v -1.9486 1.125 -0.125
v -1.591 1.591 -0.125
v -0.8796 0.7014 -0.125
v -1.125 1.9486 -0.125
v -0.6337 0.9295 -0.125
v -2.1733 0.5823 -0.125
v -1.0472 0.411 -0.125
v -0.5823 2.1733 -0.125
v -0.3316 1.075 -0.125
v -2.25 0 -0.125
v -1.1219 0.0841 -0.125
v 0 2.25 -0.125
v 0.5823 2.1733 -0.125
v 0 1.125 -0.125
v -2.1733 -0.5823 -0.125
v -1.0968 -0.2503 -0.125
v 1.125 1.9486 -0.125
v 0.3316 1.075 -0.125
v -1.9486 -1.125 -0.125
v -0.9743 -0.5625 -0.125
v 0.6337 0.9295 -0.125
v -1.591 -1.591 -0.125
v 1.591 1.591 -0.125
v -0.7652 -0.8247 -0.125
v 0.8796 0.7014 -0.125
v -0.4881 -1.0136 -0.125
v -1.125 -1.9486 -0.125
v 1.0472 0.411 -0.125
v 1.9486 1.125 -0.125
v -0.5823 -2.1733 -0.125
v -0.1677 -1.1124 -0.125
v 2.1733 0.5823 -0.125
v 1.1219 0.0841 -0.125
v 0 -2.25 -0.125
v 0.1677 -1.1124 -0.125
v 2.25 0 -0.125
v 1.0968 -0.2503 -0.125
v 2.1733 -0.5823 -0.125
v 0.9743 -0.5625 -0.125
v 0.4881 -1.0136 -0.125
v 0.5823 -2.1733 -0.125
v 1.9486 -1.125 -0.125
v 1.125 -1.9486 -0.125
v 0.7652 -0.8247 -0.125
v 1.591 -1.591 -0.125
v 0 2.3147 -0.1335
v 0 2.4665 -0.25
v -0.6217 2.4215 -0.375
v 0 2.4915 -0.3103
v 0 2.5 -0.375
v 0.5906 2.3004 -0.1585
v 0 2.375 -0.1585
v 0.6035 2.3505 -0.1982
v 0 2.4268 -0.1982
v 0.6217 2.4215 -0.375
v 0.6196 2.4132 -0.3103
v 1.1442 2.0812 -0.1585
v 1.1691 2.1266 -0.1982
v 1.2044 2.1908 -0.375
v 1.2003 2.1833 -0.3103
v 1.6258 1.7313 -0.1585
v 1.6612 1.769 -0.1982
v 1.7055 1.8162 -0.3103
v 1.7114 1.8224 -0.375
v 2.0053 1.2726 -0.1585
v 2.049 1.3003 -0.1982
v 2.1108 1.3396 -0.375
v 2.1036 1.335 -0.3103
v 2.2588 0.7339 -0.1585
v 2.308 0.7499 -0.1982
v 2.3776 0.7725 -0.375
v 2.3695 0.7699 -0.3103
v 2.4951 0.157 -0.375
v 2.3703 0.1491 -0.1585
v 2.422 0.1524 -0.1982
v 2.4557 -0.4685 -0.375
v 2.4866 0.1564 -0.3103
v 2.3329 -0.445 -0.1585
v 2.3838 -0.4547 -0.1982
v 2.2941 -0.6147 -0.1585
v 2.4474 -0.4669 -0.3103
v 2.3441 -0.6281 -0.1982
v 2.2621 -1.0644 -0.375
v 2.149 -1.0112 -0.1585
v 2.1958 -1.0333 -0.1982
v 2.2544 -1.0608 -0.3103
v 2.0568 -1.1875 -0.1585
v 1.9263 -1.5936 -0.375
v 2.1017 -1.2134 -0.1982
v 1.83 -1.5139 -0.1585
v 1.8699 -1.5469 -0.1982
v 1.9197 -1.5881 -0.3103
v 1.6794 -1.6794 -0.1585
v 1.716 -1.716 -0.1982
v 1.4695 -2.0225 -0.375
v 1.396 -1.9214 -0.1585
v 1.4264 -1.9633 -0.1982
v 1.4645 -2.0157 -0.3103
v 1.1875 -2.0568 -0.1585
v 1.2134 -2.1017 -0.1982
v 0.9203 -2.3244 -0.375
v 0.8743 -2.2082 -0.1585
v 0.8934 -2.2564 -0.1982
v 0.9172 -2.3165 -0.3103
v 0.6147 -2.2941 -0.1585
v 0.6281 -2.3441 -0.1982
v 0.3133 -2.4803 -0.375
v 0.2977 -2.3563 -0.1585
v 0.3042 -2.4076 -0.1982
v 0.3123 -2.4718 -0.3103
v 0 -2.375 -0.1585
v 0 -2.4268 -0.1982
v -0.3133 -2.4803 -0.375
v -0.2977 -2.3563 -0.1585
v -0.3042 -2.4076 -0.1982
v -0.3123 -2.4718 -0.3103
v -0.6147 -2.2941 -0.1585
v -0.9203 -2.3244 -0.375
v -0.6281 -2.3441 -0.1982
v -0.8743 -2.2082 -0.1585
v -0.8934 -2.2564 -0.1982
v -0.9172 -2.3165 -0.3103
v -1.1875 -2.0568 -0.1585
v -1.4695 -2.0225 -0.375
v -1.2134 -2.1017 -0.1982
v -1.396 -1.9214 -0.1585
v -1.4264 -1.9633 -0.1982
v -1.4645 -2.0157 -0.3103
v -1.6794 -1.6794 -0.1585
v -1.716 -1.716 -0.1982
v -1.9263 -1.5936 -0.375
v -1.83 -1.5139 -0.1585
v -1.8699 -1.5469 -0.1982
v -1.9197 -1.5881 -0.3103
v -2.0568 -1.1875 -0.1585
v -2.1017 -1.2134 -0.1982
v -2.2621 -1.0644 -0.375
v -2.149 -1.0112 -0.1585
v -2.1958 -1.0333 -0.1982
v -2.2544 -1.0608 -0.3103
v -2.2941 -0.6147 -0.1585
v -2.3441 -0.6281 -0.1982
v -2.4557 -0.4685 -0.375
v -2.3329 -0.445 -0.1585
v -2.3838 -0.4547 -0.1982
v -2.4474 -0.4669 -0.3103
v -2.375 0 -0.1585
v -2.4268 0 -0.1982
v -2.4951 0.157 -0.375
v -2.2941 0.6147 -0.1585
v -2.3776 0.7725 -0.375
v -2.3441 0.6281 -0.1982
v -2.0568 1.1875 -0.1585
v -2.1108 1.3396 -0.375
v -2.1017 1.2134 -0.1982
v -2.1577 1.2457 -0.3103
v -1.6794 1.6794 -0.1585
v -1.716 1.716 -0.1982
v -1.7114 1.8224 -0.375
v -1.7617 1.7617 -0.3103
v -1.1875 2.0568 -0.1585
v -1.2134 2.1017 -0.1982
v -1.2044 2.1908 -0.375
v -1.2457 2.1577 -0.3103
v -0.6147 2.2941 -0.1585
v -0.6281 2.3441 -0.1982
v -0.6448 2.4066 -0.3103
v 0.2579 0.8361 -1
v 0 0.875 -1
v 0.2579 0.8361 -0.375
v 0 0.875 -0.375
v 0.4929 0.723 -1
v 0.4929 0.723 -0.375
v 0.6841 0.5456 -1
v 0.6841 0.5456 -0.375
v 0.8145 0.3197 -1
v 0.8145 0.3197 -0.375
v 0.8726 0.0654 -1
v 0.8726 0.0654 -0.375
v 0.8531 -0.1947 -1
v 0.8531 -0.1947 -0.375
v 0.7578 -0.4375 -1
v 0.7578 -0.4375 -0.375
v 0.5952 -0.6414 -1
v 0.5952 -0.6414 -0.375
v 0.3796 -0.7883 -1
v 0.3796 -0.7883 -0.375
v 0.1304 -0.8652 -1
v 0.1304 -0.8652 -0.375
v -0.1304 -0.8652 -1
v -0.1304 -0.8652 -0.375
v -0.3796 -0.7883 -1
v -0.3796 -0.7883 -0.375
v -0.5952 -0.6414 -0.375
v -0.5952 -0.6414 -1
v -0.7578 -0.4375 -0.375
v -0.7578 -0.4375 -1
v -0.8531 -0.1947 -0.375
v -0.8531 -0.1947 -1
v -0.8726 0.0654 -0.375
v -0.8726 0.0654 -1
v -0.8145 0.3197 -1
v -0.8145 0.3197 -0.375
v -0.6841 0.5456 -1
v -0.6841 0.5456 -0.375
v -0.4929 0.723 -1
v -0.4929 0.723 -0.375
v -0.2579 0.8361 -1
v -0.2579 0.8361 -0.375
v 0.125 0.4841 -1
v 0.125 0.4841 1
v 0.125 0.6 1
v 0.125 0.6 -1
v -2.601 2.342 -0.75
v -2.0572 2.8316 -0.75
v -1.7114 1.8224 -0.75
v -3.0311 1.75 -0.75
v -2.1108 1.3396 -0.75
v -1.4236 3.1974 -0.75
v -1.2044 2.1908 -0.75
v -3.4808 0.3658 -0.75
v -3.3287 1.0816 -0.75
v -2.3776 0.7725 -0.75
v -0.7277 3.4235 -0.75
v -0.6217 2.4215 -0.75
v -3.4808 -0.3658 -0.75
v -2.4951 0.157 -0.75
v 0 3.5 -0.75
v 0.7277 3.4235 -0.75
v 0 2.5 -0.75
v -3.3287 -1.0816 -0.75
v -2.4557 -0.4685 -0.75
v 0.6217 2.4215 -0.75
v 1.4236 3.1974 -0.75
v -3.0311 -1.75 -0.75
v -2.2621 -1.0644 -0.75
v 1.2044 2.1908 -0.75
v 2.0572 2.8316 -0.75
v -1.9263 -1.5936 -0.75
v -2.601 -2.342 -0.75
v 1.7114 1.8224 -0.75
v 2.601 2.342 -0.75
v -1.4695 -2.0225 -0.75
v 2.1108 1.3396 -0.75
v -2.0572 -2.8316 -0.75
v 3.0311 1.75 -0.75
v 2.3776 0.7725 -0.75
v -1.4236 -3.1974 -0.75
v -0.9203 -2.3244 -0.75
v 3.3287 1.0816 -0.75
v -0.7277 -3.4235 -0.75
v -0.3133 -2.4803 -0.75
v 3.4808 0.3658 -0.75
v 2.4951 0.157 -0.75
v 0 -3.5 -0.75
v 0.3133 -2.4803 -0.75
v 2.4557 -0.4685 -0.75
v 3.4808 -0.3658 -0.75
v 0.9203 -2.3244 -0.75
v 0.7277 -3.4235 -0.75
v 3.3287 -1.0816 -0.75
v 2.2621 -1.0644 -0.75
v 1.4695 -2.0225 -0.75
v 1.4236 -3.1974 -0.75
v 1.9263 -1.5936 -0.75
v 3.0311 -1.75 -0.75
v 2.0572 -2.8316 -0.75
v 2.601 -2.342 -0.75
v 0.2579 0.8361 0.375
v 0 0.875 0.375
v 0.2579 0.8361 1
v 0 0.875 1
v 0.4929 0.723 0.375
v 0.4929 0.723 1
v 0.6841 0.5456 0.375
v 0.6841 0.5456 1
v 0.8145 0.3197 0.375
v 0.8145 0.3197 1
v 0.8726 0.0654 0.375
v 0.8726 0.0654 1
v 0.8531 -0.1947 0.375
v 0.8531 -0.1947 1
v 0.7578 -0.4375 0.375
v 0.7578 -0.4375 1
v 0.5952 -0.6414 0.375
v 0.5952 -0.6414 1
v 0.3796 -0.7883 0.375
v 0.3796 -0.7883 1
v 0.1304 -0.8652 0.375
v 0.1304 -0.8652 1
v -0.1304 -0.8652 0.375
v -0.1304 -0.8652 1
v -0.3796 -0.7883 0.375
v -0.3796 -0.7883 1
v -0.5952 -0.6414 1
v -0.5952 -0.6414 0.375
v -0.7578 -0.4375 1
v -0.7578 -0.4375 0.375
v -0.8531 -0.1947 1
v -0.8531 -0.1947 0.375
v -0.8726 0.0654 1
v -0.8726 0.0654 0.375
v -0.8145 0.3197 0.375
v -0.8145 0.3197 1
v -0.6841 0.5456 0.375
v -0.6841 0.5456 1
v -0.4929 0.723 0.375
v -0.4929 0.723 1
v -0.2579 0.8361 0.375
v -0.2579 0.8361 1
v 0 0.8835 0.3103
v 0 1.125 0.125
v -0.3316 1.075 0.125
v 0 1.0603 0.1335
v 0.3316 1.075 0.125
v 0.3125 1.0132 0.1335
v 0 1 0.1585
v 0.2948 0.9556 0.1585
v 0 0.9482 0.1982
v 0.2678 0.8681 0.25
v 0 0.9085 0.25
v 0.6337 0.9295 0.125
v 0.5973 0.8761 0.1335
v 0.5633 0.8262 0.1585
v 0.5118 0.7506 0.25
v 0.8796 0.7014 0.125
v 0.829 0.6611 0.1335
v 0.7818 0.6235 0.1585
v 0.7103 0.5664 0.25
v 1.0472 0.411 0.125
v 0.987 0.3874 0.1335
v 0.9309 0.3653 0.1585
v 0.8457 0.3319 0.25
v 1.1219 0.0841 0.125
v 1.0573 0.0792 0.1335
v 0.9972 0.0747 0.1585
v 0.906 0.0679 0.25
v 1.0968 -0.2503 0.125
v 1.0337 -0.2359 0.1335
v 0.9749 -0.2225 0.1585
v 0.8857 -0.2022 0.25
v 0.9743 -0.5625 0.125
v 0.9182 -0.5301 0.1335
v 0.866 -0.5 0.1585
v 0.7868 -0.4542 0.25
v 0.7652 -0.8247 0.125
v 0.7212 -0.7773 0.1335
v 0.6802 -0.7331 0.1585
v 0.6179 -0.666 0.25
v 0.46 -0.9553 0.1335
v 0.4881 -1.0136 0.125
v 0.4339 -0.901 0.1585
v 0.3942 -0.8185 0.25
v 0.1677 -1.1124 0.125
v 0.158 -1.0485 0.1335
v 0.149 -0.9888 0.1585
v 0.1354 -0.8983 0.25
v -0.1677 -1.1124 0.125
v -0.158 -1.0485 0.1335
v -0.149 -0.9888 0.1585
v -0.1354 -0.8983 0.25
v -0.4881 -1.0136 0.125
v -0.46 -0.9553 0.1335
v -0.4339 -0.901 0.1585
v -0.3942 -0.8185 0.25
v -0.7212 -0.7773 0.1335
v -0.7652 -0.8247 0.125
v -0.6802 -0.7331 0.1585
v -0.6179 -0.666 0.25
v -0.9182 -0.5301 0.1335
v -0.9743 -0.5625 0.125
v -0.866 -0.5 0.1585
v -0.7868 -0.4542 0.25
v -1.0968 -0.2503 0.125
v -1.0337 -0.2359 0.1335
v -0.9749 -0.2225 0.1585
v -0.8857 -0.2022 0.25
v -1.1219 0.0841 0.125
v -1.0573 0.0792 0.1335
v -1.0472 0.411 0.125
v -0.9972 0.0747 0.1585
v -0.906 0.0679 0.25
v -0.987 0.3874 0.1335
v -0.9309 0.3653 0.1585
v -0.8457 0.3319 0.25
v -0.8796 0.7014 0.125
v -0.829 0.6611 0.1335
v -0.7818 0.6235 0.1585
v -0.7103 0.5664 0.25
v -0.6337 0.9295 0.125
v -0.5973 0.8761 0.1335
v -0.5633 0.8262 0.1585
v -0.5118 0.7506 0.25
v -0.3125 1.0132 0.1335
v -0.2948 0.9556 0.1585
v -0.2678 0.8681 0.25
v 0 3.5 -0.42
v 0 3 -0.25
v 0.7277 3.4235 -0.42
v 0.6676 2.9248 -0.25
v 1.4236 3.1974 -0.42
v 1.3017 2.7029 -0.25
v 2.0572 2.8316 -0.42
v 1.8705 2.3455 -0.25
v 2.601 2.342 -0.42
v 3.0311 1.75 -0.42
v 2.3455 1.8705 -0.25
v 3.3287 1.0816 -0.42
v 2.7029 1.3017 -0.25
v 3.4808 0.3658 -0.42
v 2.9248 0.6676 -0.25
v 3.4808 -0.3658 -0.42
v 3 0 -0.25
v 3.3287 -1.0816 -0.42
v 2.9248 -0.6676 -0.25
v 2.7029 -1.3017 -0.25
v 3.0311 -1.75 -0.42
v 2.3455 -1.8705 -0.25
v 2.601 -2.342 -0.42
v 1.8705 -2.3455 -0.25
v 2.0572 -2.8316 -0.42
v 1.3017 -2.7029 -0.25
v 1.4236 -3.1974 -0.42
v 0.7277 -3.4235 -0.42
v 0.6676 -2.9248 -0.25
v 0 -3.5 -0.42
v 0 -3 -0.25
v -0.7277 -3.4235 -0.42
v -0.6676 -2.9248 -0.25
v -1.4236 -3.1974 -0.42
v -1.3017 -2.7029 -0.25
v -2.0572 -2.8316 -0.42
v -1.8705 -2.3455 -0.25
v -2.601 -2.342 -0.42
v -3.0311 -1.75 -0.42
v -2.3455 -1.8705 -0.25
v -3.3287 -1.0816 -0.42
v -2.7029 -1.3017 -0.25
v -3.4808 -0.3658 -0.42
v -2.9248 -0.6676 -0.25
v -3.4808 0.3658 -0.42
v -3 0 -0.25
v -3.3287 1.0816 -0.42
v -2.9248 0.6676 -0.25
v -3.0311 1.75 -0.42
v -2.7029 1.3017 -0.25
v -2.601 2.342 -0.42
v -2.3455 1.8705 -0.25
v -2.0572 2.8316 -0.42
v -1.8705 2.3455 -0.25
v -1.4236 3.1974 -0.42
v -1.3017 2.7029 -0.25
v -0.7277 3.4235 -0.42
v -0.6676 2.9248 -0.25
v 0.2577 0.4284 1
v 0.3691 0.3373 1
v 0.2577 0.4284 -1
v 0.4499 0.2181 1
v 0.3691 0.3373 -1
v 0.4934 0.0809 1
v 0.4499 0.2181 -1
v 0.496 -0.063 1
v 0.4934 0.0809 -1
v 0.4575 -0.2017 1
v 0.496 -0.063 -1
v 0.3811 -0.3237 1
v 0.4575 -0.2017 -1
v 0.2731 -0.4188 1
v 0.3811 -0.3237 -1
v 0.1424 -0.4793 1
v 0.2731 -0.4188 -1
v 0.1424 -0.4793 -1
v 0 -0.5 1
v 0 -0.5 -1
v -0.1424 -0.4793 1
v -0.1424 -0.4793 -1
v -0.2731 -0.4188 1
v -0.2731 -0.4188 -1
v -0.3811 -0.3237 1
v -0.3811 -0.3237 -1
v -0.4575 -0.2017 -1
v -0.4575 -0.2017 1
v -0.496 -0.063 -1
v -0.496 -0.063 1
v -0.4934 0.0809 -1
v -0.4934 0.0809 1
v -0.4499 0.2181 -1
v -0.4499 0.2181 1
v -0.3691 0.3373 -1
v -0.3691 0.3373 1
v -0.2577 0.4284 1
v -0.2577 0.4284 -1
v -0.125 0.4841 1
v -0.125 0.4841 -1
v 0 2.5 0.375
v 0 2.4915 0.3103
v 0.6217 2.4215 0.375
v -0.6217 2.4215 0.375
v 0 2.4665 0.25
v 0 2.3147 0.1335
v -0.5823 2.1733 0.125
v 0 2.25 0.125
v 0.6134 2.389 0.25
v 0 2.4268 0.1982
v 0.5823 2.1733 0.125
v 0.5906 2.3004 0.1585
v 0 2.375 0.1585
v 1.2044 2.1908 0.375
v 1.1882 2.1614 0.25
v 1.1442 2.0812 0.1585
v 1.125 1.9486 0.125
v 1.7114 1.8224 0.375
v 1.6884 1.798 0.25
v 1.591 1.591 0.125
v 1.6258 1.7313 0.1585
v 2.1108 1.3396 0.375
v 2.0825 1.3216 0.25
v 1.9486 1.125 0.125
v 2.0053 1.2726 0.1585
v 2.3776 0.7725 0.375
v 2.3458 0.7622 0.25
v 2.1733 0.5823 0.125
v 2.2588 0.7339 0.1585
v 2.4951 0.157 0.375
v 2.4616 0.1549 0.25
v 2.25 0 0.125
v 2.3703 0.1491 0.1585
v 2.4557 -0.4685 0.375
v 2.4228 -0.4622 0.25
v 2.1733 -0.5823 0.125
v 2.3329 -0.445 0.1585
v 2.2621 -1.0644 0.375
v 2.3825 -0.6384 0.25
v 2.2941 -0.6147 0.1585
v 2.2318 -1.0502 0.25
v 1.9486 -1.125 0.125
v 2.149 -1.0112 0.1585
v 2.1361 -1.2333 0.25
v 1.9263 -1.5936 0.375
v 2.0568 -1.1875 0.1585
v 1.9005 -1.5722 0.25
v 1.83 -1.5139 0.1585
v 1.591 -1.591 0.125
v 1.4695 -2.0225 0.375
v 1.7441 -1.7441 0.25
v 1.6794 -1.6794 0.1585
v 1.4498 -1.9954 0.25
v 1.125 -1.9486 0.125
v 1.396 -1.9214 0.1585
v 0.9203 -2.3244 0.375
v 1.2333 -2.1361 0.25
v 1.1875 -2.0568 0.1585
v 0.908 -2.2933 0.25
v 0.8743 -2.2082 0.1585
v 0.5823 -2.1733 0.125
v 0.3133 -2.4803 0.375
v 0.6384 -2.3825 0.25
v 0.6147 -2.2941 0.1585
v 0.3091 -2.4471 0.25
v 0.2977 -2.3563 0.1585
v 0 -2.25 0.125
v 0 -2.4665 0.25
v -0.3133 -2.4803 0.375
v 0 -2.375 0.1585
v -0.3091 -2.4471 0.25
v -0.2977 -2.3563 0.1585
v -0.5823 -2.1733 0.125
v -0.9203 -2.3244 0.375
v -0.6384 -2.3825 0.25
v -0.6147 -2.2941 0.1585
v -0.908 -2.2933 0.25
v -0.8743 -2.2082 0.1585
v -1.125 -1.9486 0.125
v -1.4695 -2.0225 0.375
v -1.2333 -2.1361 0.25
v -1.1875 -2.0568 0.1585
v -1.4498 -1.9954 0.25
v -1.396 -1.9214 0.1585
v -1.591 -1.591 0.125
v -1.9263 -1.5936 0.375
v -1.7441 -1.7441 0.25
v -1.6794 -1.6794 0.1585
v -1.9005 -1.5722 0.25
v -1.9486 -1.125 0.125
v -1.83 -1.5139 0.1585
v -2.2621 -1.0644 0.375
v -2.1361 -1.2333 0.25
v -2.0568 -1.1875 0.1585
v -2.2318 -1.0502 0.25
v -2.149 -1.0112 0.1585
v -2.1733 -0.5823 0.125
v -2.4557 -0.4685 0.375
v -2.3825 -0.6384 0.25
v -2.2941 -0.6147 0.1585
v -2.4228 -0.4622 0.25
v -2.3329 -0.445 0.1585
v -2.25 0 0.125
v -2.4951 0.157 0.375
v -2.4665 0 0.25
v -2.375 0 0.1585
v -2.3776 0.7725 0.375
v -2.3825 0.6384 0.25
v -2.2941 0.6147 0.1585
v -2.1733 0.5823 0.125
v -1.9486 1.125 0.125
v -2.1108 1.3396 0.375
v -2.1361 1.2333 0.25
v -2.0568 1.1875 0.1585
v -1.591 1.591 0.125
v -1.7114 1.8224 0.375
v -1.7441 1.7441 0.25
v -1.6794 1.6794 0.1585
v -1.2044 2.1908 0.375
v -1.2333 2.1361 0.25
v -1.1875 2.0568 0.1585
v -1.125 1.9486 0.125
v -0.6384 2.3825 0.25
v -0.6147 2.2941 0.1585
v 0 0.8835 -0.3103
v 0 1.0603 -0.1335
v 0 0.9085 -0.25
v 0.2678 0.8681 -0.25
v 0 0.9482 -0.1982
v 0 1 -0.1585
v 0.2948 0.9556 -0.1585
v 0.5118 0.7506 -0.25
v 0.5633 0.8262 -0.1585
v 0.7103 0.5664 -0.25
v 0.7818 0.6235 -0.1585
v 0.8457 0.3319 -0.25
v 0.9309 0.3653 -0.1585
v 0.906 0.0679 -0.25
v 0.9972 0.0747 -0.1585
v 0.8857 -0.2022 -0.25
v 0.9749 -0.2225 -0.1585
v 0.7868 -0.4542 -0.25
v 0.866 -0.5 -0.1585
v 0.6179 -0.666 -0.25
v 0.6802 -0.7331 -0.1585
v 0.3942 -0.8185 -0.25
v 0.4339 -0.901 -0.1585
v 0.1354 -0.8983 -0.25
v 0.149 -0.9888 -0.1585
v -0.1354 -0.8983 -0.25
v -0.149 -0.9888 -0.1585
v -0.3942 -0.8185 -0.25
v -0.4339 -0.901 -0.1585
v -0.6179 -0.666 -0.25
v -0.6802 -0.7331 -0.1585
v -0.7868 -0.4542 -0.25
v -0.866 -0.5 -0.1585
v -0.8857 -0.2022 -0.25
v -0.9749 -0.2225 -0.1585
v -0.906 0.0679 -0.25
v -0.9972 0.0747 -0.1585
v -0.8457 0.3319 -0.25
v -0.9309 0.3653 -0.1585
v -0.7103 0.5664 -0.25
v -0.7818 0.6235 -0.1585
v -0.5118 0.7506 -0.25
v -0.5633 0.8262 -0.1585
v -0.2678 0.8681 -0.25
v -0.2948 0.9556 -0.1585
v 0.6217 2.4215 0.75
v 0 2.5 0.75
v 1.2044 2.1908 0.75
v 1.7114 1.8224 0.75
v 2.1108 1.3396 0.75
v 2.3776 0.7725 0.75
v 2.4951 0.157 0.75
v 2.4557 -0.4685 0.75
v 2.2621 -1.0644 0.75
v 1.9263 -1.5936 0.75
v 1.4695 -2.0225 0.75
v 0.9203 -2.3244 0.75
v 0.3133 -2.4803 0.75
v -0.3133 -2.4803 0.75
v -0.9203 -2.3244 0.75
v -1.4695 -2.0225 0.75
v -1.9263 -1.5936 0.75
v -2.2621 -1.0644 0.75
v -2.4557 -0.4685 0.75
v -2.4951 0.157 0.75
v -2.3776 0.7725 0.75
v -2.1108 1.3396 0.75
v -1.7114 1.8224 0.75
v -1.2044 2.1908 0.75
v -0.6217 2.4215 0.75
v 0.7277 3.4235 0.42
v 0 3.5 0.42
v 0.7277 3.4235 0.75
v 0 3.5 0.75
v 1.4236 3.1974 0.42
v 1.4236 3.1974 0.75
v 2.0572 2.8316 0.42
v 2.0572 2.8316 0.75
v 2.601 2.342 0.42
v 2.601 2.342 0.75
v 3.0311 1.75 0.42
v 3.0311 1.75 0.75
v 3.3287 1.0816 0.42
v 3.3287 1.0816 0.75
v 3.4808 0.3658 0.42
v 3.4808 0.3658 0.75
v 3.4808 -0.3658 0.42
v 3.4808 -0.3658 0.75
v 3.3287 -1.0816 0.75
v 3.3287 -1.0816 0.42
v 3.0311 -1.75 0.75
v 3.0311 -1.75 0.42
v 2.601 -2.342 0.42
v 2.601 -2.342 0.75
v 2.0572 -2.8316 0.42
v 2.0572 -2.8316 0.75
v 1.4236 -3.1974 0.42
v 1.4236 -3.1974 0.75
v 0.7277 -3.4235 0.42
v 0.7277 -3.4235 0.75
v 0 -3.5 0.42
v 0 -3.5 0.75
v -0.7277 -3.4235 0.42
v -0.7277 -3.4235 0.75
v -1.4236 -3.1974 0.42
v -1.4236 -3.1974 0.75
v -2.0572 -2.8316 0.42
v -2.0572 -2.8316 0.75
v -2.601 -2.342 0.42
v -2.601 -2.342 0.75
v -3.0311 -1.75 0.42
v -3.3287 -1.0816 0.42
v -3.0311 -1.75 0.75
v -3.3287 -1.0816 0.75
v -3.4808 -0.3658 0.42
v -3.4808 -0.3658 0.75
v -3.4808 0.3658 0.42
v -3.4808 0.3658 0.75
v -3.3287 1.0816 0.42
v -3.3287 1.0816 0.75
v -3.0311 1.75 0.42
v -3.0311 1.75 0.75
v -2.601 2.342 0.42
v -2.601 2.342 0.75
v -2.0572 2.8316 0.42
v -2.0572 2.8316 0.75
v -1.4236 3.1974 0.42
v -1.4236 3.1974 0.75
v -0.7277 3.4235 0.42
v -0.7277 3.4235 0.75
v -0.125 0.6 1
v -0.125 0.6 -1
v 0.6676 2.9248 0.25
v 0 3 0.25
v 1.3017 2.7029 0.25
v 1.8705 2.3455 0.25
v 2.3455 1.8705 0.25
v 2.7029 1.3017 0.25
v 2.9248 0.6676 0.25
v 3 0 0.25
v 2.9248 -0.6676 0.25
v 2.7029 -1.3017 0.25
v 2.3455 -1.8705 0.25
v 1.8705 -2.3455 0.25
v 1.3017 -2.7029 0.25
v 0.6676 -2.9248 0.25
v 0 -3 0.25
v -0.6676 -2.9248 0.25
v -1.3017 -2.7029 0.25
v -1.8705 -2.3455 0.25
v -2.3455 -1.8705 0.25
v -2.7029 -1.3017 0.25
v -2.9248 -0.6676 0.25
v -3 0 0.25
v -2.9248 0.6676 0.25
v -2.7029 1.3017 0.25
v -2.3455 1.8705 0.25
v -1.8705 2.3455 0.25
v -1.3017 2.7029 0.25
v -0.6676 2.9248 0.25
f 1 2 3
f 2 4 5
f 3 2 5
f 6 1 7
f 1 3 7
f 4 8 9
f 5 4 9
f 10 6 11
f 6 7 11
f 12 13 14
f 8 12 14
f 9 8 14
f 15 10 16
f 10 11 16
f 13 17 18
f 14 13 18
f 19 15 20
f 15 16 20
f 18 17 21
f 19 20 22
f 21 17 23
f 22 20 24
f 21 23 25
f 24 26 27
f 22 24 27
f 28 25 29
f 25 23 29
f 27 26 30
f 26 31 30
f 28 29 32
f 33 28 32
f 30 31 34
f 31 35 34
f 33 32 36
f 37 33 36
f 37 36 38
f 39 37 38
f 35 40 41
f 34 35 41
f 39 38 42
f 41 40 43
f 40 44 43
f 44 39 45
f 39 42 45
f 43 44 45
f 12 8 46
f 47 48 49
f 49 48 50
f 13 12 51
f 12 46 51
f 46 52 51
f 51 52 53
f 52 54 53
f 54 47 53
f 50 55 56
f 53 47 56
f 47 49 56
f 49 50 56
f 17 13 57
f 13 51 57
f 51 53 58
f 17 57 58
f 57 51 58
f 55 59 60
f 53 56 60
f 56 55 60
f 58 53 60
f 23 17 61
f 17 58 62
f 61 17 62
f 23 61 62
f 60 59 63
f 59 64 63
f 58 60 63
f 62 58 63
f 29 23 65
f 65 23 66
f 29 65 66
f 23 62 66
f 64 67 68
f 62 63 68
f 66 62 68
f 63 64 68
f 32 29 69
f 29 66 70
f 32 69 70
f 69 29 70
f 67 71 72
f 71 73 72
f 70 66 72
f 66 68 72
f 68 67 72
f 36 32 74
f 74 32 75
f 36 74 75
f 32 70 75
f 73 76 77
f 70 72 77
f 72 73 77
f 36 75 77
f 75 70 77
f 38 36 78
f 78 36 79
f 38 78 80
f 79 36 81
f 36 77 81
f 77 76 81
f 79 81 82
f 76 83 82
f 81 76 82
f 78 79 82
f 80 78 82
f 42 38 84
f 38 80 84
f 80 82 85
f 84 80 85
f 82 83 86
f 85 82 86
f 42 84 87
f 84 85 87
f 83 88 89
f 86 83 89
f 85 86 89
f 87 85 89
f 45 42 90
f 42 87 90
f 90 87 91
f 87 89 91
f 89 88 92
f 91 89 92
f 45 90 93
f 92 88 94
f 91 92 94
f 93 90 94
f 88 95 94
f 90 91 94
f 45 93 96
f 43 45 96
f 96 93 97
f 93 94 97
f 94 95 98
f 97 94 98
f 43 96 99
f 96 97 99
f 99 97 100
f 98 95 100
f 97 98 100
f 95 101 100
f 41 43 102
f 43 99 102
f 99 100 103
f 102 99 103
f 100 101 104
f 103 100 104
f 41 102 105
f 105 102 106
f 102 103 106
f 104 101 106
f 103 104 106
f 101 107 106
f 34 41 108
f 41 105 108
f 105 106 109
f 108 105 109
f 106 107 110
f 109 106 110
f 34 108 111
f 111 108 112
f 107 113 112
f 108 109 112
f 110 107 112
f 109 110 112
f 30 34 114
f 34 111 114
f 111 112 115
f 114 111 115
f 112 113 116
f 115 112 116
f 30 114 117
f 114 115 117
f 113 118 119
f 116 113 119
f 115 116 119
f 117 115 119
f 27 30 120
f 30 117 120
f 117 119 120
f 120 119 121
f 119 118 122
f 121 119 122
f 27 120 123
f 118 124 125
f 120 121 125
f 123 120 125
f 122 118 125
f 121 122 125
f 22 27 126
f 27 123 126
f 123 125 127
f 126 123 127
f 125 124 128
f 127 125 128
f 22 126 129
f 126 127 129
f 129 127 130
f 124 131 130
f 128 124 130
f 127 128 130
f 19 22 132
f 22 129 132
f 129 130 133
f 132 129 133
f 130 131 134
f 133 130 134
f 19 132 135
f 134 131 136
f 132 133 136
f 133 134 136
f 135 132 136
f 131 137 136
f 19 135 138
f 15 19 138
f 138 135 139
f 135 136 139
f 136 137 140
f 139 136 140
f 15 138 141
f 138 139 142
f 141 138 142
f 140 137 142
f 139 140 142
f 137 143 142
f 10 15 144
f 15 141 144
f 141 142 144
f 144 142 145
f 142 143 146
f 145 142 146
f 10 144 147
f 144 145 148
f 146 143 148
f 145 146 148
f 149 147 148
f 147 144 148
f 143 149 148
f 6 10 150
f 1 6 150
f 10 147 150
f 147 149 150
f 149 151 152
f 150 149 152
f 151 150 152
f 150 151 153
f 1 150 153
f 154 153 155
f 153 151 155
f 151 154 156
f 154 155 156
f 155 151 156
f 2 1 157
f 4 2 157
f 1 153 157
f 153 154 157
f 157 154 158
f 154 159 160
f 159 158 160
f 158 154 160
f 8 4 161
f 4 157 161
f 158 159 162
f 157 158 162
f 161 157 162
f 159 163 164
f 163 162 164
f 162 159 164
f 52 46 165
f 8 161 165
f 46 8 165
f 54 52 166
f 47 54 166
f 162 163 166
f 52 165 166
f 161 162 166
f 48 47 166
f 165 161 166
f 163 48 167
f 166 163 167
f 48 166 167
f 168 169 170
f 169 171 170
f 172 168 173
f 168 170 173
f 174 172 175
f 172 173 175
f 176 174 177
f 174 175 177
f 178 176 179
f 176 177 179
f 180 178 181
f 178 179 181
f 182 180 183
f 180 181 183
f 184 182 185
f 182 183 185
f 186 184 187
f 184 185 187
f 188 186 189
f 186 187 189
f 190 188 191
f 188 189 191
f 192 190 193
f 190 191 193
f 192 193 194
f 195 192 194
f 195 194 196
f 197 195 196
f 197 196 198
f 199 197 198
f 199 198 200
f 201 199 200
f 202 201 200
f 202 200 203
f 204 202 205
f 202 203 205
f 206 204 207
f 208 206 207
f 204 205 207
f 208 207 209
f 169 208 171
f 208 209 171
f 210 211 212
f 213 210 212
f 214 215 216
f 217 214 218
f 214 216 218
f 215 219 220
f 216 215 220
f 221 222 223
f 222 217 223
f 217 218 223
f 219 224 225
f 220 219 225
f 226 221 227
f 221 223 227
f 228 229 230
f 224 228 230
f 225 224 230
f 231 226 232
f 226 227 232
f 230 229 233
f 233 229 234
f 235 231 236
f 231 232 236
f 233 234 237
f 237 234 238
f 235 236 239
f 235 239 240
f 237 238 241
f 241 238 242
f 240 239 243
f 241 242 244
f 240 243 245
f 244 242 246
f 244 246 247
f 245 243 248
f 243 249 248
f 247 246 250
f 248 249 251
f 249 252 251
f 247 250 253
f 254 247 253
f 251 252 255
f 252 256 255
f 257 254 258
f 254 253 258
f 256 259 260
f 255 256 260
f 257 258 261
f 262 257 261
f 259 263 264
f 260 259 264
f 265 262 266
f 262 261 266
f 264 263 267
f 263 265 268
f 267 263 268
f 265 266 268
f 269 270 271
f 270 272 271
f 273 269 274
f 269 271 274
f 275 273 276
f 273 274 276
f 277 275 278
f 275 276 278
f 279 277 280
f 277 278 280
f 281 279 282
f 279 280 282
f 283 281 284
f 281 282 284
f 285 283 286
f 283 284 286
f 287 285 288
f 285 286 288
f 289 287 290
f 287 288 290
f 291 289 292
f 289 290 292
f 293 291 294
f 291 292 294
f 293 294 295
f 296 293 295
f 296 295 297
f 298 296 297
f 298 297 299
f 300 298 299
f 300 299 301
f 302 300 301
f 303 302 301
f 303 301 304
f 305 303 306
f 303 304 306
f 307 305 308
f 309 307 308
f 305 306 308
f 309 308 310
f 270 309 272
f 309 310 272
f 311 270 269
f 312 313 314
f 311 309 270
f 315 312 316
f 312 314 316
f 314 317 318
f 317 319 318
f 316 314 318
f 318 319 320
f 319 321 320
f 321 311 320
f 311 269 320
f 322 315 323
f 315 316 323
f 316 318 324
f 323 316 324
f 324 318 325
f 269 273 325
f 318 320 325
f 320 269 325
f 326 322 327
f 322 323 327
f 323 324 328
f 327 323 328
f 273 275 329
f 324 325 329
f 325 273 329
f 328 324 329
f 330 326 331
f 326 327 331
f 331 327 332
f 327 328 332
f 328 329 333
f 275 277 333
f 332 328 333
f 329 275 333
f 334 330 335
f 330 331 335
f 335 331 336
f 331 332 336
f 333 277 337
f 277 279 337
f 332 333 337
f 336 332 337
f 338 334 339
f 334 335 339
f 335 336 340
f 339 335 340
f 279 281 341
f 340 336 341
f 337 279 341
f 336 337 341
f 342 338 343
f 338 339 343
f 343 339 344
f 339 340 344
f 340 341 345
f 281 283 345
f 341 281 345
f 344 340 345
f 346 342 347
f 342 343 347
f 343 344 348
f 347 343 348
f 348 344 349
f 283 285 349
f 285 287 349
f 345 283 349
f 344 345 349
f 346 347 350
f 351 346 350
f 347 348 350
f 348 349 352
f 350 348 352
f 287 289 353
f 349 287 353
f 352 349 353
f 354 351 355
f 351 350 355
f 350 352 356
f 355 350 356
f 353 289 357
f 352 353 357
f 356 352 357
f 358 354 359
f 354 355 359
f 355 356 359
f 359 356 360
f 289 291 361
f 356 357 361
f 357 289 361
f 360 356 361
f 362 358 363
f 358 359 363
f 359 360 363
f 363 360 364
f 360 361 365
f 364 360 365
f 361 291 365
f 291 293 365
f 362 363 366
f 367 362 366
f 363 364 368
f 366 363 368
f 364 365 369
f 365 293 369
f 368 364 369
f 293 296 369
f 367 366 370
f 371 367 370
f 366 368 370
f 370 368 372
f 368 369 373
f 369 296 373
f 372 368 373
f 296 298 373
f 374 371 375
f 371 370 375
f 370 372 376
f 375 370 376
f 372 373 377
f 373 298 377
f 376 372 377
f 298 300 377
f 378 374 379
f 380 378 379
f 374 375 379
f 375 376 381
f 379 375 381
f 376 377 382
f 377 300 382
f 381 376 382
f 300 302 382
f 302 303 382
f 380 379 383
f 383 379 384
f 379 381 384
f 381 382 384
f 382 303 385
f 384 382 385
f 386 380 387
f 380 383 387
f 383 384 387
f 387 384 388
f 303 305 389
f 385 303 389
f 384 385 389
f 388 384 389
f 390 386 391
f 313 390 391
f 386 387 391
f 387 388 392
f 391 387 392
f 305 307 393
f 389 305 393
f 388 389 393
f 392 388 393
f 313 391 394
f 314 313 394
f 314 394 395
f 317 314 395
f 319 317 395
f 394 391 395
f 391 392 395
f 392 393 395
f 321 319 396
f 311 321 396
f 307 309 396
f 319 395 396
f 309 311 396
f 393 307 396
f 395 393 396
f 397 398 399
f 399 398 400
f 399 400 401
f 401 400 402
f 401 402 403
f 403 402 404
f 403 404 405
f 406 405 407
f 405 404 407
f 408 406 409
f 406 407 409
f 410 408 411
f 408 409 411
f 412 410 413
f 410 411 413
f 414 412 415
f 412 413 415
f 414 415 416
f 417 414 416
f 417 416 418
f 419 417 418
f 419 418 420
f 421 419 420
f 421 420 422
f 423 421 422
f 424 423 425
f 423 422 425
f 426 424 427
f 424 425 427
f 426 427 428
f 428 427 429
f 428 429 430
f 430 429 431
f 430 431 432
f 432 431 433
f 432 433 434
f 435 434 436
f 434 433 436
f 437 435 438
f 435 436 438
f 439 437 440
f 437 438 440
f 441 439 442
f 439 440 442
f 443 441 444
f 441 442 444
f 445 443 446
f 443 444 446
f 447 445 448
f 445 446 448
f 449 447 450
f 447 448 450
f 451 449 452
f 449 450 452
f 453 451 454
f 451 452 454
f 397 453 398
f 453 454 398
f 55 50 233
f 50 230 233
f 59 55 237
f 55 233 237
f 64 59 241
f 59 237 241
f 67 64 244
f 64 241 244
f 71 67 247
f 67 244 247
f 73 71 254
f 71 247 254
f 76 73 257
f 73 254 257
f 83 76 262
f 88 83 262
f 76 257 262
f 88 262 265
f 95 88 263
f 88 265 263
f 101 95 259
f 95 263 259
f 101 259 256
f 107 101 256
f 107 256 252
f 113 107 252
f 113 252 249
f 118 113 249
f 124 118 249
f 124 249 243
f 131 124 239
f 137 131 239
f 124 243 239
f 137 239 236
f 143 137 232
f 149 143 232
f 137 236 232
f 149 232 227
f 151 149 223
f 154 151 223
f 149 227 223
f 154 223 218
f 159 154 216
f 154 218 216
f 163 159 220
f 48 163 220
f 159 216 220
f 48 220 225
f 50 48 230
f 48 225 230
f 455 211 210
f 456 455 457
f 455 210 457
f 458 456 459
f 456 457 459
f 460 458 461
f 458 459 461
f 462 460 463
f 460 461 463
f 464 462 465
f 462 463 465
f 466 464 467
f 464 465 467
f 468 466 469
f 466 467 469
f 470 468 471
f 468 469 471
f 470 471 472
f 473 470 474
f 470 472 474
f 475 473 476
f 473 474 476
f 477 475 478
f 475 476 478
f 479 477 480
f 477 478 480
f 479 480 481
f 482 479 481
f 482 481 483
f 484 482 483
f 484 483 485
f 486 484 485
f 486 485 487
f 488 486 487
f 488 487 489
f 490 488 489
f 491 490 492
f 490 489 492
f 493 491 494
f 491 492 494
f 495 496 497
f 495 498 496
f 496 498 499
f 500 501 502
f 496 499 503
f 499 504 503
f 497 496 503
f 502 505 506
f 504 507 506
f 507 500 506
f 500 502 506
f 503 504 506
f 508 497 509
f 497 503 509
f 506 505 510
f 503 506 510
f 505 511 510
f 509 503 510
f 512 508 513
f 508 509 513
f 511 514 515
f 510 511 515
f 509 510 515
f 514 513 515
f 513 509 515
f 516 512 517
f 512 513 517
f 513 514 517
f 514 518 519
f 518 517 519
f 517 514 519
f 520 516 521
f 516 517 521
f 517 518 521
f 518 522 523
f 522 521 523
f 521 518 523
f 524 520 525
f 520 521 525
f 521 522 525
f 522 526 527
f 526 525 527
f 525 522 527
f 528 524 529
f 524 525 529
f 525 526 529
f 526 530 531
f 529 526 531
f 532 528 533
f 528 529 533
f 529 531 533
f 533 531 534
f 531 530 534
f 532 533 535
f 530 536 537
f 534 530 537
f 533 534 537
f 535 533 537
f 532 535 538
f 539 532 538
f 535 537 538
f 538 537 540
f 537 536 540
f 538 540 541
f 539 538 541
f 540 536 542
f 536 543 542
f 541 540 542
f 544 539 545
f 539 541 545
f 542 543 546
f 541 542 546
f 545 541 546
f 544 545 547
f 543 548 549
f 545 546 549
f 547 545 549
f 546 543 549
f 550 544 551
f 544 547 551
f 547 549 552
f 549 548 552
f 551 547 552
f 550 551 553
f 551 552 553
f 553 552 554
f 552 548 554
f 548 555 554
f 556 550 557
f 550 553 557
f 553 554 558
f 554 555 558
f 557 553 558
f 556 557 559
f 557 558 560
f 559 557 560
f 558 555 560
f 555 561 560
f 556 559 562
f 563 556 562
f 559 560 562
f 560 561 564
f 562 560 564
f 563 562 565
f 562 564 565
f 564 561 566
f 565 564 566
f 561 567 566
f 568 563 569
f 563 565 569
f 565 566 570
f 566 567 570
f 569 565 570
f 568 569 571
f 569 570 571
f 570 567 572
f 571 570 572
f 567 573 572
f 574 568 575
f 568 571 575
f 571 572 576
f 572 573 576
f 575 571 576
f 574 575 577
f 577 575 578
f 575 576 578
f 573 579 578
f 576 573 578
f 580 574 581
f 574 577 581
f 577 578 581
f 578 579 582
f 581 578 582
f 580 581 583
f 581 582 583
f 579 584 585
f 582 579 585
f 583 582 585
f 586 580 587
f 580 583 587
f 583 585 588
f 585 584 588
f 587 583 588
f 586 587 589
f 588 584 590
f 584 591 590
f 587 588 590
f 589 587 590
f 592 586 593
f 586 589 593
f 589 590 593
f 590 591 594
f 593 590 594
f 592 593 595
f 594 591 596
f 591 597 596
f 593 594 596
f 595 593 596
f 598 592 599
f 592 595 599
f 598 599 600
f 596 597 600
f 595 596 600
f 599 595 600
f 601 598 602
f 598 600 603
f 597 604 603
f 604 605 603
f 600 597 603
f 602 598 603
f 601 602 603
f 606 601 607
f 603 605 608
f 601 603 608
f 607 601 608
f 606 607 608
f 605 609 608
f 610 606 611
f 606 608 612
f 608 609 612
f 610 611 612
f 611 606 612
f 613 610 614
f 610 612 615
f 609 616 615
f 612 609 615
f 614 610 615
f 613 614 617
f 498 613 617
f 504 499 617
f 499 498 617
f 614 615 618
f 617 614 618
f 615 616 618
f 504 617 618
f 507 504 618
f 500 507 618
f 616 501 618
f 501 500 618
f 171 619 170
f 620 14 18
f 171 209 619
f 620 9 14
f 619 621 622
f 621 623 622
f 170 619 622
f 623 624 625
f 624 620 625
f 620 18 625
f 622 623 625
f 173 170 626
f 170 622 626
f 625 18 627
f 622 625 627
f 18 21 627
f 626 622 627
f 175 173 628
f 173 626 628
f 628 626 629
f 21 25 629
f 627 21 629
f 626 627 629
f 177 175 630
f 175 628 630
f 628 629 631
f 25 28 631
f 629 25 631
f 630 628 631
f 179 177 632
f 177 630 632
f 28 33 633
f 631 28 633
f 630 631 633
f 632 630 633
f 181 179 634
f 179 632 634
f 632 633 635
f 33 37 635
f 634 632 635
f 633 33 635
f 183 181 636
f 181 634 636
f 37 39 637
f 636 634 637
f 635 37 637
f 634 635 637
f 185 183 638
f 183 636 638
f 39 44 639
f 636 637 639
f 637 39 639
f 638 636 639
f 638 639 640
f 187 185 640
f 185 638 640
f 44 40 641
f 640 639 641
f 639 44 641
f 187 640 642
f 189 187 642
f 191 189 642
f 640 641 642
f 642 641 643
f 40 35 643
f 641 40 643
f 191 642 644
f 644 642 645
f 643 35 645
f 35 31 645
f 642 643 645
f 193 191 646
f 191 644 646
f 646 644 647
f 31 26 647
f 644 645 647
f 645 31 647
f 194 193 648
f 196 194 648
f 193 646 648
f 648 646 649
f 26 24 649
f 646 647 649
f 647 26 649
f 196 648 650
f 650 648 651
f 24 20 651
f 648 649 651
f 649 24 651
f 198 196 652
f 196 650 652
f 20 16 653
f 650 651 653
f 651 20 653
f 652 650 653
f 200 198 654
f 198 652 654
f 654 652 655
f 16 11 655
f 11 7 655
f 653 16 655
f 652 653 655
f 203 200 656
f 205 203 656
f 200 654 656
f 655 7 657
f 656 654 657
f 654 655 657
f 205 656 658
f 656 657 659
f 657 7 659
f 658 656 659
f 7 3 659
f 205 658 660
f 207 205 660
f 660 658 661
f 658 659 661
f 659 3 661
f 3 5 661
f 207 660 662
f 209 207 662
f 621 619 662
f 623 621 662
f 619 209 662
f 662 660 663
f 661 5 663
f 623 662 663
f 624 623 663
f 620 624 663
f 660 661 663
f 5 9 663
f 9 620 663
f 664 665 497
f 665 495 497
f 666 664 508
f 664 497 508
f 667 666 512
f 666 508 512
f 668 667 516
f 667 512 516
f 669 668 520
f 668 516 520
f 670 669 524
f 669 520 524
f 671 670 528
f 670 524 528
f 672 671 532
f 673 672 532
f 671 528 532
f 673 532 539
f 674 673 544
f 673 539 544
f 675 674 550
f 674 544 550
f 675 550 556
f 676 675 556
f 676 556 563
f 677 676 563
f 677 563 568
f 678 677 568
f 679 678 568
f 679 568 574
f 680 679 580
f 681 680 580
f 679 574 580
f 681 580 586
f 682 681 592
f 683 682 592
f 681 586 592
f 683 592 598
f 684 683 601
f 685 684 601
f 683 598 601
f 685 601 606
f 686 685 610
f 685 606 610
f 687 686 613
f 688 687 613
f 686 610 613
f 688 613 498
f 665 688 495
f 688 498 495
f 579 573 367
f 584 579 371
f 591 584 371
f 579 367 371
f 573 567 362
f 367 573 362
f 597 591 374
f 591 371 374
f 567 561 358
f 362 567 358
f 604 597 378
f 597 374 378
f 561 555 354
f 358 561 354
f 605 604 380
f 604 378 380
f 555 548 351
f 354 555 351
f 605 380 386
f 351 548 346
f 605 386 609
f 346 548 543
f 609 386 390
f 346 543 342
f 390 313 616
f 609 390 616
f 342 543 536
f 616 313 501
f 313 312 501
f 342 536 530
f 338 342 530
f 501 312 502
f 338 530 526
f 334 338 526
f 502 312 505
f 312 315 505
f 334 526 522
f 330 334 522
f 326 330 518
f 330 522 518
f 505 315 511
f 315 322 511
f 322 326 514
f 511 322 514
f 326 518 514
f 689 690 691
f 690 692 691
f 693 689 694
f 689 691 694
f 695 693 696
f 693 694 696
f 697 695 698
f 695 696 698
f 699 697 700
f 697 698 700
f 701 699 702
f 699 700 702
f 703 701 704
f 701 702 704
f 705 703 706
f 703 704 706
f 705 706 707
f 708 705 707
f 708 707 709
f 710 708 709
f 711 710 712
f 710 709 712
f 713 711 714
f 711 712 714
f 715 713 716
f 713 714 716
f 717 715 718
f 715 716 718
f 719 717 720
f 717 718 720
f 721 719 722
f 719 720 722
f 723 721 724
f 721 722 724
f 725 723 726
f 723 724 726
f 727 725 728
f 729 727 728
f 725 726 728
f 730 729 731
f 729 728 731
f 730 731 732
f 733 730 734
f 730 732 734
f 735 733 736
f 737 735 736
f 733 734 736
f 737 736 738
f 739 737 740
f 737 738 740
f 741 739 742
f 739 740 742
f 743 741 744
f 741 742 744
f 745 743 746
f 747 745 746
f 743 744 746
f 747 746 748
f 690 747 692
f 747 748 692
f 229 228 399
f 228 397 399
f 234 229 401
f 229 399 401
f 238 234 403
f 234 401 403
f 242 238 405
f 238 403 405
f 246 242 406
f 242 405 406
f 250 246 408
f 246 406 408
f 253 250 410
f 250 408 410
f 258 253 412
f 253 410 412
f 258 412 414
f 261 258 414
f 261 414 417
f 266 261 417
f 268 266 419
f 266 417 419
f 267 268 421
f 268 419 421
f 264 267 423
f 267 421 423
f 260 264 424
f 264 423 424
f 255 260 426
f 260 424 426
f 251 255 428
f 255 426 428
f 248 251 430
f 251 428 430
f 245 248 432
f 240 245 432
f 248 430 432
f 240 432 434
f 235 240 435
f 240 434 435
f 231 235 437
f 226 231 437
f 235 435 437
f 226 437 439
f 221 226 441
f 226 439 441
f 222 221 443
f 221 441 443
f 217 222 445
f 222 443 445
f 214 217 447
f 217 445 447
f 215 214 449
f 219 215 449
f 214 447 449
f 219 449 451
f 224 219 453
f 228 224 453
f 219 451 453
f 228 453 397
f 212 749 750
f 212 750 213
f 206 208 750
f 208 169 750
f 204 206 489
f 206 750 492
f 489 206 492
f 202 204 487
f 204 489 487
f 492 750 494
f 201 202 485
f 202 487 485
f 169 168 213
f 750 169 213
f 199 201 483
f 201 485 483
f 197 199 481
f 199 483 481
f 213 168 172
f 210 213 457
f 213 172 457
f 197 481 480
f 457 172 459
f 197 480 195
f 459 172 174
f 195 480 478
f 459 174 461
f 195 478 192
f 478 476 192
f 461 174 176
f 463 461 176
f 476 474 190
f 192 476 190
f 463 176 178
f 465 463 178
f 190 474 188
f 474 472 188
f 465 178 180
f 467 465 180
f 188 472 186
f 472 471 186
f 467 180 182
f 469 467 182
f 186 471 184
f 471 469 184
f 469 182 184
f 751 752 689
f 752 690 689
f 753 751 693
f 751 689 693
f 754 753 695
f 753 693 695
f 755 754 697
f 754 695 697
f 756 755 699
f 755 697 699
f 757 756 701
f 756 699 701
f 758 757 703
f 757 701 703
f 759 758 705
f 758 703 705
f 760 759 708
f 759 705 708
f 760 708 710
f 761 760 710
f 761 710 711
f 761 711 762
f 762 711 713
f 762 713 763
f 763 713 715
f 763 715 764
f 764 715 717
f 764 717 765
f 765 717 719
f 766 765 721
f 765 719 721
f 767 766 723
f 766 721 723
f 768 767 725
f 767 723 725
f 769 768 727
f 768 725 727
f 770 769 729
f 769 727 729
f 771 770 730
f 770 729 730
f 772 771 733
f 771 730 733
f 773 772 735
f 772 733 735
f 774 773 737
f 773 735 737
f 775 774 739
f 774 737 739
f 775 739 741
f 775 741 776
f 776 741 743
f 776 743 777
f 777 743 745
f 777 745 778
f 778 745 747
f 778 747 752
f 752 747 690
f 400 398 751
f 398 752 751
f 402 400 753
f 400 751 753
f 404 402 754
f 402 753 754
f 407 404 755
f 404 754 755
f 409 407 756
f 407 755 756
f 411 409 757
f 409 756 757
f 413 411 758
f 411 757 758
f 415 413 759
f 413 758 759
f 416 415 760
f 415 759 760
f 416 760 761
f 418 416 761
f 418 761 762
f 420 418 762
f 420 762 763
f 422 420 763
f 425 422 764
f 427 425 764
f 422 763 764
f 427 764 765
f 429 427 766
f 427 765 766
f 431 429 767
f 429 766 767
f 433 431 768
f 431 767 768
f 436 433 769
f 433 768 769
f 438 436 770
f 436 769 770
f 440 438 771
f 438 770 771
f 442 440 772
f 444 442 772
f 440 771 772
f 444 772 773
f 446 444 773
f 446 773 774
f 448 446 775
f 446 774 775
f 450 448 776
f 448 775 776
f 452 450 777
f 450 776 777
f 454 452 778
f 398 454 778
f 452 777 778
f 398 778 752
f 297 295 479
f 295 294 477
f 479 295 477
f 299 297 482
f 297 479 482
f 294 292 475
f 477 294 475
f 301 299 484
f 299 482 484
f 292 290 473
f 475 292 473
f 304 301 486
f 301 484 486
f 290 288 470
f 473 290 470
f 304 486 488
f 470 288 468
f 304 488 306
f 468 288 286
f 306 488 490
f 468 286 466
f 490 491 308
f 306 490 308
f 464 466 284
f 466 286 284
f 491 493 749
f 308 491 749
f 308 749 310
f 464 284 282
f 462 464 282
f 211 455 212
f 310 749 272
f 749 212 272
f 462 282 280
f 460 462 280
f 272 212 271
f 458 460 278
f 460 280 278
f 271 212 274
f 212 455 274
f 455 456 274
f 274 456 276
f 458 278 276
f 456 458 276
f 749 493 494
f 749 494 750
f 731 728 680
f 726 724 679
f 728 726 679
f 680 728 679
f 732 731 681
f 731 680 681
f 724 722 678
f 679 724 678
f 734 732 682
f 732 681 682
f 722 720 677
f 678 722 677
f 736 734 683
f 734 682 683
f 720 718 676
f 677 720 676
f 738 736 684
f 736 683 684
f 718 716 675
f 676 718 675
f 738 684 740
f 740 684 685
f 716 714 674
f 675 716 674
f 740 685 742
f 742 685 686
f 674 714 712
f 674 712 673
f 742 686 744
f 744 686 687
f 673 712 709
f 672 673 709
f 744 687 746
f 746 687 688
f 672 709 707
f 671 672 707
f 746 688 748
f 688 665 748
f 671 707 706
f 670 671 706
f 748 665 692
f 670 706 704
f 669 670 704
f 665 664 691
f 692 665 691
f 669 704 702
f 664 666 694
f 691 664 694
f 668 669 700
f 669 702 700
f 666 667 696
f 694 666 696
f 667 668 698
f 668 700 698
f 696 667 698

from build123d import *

# Parameters (mm, degrees)
SKETCH2_W          = 0.25
SKETCH2_H          = 0.370788844
CUT_EXTRUDE1_DEPTH = 20.6248


with BuildPart() as part:
    # Sketch1 → Revolve1 (revolve)
    with BuildSketch(Plane(origin=(0, 0, 0), x_dir=(0, 0, -1), z_dir=(1, 0, 0))):
        with BuildLine():
            Line((1, 0.875), (0.375, 0.875))
            ThreePointArc((0.375, 0.875), (0.198223305, 0.948223305), (0.125, 1.125))
            Line((0.125, 1.125), (0.125, 2.25))
            ThreePointArc((0.125, 2.25), (0.198223305, 2.426776695), (0.375, 2.5))
            Line((0.375, 2.5), (0.75, 2.5))
            Line((0.75, 2.5), (0.75, 3.5))
            Line((0.75, 3.5), (0.42, 3.5))
            Line((0.42, 3.5), (0.25, 3))
            Line((0.25, 3), (-0.25, 3))
            Line((-0.25, 3), (-0.42, 3.5))
            Line((-0.42, 3.5), (-0.75, 3.5))
            Line((-0.75, 3.5), (-0.75, 2.5))
            Line((-0.75, 2.5), (-0.375, 2.5))
            ThreePointArc((-0.375, 2.5), (-0.198223305, 2.426776695), (-0.125, 2.25))
            Line((-0.125, 2.25), (-0.125, 1.125))
            ThreePointArc((-0.125, 1.125), (-0.198223305, 0.948223305), (-0.375, 0.875))
            Line((-0.375, 0.875), (-1, 0.875))
            Line((-1, 0.875), (-1, 0.5))
            Line((-1, 0.5), (1, 0.5))
            Line((1, 0.5), (1, 0.875))
        make_face()
    revolve(axis=Axis((0, 0, 1.479906814), (0, 0, -1)))

    # Sketch2 → Cut-Extrude1 (cut)
    with BuildSketch(Plane.XY.offset(1)):
        with Locations((0, 0.414605578)):
            Rectangle(SKETCH2_W, SKETCH2_H)
    extrude(amount=-CUT_EXTRUDE1_DEPTH, mode=Mode.SUBTRACT)


solid = part.part
